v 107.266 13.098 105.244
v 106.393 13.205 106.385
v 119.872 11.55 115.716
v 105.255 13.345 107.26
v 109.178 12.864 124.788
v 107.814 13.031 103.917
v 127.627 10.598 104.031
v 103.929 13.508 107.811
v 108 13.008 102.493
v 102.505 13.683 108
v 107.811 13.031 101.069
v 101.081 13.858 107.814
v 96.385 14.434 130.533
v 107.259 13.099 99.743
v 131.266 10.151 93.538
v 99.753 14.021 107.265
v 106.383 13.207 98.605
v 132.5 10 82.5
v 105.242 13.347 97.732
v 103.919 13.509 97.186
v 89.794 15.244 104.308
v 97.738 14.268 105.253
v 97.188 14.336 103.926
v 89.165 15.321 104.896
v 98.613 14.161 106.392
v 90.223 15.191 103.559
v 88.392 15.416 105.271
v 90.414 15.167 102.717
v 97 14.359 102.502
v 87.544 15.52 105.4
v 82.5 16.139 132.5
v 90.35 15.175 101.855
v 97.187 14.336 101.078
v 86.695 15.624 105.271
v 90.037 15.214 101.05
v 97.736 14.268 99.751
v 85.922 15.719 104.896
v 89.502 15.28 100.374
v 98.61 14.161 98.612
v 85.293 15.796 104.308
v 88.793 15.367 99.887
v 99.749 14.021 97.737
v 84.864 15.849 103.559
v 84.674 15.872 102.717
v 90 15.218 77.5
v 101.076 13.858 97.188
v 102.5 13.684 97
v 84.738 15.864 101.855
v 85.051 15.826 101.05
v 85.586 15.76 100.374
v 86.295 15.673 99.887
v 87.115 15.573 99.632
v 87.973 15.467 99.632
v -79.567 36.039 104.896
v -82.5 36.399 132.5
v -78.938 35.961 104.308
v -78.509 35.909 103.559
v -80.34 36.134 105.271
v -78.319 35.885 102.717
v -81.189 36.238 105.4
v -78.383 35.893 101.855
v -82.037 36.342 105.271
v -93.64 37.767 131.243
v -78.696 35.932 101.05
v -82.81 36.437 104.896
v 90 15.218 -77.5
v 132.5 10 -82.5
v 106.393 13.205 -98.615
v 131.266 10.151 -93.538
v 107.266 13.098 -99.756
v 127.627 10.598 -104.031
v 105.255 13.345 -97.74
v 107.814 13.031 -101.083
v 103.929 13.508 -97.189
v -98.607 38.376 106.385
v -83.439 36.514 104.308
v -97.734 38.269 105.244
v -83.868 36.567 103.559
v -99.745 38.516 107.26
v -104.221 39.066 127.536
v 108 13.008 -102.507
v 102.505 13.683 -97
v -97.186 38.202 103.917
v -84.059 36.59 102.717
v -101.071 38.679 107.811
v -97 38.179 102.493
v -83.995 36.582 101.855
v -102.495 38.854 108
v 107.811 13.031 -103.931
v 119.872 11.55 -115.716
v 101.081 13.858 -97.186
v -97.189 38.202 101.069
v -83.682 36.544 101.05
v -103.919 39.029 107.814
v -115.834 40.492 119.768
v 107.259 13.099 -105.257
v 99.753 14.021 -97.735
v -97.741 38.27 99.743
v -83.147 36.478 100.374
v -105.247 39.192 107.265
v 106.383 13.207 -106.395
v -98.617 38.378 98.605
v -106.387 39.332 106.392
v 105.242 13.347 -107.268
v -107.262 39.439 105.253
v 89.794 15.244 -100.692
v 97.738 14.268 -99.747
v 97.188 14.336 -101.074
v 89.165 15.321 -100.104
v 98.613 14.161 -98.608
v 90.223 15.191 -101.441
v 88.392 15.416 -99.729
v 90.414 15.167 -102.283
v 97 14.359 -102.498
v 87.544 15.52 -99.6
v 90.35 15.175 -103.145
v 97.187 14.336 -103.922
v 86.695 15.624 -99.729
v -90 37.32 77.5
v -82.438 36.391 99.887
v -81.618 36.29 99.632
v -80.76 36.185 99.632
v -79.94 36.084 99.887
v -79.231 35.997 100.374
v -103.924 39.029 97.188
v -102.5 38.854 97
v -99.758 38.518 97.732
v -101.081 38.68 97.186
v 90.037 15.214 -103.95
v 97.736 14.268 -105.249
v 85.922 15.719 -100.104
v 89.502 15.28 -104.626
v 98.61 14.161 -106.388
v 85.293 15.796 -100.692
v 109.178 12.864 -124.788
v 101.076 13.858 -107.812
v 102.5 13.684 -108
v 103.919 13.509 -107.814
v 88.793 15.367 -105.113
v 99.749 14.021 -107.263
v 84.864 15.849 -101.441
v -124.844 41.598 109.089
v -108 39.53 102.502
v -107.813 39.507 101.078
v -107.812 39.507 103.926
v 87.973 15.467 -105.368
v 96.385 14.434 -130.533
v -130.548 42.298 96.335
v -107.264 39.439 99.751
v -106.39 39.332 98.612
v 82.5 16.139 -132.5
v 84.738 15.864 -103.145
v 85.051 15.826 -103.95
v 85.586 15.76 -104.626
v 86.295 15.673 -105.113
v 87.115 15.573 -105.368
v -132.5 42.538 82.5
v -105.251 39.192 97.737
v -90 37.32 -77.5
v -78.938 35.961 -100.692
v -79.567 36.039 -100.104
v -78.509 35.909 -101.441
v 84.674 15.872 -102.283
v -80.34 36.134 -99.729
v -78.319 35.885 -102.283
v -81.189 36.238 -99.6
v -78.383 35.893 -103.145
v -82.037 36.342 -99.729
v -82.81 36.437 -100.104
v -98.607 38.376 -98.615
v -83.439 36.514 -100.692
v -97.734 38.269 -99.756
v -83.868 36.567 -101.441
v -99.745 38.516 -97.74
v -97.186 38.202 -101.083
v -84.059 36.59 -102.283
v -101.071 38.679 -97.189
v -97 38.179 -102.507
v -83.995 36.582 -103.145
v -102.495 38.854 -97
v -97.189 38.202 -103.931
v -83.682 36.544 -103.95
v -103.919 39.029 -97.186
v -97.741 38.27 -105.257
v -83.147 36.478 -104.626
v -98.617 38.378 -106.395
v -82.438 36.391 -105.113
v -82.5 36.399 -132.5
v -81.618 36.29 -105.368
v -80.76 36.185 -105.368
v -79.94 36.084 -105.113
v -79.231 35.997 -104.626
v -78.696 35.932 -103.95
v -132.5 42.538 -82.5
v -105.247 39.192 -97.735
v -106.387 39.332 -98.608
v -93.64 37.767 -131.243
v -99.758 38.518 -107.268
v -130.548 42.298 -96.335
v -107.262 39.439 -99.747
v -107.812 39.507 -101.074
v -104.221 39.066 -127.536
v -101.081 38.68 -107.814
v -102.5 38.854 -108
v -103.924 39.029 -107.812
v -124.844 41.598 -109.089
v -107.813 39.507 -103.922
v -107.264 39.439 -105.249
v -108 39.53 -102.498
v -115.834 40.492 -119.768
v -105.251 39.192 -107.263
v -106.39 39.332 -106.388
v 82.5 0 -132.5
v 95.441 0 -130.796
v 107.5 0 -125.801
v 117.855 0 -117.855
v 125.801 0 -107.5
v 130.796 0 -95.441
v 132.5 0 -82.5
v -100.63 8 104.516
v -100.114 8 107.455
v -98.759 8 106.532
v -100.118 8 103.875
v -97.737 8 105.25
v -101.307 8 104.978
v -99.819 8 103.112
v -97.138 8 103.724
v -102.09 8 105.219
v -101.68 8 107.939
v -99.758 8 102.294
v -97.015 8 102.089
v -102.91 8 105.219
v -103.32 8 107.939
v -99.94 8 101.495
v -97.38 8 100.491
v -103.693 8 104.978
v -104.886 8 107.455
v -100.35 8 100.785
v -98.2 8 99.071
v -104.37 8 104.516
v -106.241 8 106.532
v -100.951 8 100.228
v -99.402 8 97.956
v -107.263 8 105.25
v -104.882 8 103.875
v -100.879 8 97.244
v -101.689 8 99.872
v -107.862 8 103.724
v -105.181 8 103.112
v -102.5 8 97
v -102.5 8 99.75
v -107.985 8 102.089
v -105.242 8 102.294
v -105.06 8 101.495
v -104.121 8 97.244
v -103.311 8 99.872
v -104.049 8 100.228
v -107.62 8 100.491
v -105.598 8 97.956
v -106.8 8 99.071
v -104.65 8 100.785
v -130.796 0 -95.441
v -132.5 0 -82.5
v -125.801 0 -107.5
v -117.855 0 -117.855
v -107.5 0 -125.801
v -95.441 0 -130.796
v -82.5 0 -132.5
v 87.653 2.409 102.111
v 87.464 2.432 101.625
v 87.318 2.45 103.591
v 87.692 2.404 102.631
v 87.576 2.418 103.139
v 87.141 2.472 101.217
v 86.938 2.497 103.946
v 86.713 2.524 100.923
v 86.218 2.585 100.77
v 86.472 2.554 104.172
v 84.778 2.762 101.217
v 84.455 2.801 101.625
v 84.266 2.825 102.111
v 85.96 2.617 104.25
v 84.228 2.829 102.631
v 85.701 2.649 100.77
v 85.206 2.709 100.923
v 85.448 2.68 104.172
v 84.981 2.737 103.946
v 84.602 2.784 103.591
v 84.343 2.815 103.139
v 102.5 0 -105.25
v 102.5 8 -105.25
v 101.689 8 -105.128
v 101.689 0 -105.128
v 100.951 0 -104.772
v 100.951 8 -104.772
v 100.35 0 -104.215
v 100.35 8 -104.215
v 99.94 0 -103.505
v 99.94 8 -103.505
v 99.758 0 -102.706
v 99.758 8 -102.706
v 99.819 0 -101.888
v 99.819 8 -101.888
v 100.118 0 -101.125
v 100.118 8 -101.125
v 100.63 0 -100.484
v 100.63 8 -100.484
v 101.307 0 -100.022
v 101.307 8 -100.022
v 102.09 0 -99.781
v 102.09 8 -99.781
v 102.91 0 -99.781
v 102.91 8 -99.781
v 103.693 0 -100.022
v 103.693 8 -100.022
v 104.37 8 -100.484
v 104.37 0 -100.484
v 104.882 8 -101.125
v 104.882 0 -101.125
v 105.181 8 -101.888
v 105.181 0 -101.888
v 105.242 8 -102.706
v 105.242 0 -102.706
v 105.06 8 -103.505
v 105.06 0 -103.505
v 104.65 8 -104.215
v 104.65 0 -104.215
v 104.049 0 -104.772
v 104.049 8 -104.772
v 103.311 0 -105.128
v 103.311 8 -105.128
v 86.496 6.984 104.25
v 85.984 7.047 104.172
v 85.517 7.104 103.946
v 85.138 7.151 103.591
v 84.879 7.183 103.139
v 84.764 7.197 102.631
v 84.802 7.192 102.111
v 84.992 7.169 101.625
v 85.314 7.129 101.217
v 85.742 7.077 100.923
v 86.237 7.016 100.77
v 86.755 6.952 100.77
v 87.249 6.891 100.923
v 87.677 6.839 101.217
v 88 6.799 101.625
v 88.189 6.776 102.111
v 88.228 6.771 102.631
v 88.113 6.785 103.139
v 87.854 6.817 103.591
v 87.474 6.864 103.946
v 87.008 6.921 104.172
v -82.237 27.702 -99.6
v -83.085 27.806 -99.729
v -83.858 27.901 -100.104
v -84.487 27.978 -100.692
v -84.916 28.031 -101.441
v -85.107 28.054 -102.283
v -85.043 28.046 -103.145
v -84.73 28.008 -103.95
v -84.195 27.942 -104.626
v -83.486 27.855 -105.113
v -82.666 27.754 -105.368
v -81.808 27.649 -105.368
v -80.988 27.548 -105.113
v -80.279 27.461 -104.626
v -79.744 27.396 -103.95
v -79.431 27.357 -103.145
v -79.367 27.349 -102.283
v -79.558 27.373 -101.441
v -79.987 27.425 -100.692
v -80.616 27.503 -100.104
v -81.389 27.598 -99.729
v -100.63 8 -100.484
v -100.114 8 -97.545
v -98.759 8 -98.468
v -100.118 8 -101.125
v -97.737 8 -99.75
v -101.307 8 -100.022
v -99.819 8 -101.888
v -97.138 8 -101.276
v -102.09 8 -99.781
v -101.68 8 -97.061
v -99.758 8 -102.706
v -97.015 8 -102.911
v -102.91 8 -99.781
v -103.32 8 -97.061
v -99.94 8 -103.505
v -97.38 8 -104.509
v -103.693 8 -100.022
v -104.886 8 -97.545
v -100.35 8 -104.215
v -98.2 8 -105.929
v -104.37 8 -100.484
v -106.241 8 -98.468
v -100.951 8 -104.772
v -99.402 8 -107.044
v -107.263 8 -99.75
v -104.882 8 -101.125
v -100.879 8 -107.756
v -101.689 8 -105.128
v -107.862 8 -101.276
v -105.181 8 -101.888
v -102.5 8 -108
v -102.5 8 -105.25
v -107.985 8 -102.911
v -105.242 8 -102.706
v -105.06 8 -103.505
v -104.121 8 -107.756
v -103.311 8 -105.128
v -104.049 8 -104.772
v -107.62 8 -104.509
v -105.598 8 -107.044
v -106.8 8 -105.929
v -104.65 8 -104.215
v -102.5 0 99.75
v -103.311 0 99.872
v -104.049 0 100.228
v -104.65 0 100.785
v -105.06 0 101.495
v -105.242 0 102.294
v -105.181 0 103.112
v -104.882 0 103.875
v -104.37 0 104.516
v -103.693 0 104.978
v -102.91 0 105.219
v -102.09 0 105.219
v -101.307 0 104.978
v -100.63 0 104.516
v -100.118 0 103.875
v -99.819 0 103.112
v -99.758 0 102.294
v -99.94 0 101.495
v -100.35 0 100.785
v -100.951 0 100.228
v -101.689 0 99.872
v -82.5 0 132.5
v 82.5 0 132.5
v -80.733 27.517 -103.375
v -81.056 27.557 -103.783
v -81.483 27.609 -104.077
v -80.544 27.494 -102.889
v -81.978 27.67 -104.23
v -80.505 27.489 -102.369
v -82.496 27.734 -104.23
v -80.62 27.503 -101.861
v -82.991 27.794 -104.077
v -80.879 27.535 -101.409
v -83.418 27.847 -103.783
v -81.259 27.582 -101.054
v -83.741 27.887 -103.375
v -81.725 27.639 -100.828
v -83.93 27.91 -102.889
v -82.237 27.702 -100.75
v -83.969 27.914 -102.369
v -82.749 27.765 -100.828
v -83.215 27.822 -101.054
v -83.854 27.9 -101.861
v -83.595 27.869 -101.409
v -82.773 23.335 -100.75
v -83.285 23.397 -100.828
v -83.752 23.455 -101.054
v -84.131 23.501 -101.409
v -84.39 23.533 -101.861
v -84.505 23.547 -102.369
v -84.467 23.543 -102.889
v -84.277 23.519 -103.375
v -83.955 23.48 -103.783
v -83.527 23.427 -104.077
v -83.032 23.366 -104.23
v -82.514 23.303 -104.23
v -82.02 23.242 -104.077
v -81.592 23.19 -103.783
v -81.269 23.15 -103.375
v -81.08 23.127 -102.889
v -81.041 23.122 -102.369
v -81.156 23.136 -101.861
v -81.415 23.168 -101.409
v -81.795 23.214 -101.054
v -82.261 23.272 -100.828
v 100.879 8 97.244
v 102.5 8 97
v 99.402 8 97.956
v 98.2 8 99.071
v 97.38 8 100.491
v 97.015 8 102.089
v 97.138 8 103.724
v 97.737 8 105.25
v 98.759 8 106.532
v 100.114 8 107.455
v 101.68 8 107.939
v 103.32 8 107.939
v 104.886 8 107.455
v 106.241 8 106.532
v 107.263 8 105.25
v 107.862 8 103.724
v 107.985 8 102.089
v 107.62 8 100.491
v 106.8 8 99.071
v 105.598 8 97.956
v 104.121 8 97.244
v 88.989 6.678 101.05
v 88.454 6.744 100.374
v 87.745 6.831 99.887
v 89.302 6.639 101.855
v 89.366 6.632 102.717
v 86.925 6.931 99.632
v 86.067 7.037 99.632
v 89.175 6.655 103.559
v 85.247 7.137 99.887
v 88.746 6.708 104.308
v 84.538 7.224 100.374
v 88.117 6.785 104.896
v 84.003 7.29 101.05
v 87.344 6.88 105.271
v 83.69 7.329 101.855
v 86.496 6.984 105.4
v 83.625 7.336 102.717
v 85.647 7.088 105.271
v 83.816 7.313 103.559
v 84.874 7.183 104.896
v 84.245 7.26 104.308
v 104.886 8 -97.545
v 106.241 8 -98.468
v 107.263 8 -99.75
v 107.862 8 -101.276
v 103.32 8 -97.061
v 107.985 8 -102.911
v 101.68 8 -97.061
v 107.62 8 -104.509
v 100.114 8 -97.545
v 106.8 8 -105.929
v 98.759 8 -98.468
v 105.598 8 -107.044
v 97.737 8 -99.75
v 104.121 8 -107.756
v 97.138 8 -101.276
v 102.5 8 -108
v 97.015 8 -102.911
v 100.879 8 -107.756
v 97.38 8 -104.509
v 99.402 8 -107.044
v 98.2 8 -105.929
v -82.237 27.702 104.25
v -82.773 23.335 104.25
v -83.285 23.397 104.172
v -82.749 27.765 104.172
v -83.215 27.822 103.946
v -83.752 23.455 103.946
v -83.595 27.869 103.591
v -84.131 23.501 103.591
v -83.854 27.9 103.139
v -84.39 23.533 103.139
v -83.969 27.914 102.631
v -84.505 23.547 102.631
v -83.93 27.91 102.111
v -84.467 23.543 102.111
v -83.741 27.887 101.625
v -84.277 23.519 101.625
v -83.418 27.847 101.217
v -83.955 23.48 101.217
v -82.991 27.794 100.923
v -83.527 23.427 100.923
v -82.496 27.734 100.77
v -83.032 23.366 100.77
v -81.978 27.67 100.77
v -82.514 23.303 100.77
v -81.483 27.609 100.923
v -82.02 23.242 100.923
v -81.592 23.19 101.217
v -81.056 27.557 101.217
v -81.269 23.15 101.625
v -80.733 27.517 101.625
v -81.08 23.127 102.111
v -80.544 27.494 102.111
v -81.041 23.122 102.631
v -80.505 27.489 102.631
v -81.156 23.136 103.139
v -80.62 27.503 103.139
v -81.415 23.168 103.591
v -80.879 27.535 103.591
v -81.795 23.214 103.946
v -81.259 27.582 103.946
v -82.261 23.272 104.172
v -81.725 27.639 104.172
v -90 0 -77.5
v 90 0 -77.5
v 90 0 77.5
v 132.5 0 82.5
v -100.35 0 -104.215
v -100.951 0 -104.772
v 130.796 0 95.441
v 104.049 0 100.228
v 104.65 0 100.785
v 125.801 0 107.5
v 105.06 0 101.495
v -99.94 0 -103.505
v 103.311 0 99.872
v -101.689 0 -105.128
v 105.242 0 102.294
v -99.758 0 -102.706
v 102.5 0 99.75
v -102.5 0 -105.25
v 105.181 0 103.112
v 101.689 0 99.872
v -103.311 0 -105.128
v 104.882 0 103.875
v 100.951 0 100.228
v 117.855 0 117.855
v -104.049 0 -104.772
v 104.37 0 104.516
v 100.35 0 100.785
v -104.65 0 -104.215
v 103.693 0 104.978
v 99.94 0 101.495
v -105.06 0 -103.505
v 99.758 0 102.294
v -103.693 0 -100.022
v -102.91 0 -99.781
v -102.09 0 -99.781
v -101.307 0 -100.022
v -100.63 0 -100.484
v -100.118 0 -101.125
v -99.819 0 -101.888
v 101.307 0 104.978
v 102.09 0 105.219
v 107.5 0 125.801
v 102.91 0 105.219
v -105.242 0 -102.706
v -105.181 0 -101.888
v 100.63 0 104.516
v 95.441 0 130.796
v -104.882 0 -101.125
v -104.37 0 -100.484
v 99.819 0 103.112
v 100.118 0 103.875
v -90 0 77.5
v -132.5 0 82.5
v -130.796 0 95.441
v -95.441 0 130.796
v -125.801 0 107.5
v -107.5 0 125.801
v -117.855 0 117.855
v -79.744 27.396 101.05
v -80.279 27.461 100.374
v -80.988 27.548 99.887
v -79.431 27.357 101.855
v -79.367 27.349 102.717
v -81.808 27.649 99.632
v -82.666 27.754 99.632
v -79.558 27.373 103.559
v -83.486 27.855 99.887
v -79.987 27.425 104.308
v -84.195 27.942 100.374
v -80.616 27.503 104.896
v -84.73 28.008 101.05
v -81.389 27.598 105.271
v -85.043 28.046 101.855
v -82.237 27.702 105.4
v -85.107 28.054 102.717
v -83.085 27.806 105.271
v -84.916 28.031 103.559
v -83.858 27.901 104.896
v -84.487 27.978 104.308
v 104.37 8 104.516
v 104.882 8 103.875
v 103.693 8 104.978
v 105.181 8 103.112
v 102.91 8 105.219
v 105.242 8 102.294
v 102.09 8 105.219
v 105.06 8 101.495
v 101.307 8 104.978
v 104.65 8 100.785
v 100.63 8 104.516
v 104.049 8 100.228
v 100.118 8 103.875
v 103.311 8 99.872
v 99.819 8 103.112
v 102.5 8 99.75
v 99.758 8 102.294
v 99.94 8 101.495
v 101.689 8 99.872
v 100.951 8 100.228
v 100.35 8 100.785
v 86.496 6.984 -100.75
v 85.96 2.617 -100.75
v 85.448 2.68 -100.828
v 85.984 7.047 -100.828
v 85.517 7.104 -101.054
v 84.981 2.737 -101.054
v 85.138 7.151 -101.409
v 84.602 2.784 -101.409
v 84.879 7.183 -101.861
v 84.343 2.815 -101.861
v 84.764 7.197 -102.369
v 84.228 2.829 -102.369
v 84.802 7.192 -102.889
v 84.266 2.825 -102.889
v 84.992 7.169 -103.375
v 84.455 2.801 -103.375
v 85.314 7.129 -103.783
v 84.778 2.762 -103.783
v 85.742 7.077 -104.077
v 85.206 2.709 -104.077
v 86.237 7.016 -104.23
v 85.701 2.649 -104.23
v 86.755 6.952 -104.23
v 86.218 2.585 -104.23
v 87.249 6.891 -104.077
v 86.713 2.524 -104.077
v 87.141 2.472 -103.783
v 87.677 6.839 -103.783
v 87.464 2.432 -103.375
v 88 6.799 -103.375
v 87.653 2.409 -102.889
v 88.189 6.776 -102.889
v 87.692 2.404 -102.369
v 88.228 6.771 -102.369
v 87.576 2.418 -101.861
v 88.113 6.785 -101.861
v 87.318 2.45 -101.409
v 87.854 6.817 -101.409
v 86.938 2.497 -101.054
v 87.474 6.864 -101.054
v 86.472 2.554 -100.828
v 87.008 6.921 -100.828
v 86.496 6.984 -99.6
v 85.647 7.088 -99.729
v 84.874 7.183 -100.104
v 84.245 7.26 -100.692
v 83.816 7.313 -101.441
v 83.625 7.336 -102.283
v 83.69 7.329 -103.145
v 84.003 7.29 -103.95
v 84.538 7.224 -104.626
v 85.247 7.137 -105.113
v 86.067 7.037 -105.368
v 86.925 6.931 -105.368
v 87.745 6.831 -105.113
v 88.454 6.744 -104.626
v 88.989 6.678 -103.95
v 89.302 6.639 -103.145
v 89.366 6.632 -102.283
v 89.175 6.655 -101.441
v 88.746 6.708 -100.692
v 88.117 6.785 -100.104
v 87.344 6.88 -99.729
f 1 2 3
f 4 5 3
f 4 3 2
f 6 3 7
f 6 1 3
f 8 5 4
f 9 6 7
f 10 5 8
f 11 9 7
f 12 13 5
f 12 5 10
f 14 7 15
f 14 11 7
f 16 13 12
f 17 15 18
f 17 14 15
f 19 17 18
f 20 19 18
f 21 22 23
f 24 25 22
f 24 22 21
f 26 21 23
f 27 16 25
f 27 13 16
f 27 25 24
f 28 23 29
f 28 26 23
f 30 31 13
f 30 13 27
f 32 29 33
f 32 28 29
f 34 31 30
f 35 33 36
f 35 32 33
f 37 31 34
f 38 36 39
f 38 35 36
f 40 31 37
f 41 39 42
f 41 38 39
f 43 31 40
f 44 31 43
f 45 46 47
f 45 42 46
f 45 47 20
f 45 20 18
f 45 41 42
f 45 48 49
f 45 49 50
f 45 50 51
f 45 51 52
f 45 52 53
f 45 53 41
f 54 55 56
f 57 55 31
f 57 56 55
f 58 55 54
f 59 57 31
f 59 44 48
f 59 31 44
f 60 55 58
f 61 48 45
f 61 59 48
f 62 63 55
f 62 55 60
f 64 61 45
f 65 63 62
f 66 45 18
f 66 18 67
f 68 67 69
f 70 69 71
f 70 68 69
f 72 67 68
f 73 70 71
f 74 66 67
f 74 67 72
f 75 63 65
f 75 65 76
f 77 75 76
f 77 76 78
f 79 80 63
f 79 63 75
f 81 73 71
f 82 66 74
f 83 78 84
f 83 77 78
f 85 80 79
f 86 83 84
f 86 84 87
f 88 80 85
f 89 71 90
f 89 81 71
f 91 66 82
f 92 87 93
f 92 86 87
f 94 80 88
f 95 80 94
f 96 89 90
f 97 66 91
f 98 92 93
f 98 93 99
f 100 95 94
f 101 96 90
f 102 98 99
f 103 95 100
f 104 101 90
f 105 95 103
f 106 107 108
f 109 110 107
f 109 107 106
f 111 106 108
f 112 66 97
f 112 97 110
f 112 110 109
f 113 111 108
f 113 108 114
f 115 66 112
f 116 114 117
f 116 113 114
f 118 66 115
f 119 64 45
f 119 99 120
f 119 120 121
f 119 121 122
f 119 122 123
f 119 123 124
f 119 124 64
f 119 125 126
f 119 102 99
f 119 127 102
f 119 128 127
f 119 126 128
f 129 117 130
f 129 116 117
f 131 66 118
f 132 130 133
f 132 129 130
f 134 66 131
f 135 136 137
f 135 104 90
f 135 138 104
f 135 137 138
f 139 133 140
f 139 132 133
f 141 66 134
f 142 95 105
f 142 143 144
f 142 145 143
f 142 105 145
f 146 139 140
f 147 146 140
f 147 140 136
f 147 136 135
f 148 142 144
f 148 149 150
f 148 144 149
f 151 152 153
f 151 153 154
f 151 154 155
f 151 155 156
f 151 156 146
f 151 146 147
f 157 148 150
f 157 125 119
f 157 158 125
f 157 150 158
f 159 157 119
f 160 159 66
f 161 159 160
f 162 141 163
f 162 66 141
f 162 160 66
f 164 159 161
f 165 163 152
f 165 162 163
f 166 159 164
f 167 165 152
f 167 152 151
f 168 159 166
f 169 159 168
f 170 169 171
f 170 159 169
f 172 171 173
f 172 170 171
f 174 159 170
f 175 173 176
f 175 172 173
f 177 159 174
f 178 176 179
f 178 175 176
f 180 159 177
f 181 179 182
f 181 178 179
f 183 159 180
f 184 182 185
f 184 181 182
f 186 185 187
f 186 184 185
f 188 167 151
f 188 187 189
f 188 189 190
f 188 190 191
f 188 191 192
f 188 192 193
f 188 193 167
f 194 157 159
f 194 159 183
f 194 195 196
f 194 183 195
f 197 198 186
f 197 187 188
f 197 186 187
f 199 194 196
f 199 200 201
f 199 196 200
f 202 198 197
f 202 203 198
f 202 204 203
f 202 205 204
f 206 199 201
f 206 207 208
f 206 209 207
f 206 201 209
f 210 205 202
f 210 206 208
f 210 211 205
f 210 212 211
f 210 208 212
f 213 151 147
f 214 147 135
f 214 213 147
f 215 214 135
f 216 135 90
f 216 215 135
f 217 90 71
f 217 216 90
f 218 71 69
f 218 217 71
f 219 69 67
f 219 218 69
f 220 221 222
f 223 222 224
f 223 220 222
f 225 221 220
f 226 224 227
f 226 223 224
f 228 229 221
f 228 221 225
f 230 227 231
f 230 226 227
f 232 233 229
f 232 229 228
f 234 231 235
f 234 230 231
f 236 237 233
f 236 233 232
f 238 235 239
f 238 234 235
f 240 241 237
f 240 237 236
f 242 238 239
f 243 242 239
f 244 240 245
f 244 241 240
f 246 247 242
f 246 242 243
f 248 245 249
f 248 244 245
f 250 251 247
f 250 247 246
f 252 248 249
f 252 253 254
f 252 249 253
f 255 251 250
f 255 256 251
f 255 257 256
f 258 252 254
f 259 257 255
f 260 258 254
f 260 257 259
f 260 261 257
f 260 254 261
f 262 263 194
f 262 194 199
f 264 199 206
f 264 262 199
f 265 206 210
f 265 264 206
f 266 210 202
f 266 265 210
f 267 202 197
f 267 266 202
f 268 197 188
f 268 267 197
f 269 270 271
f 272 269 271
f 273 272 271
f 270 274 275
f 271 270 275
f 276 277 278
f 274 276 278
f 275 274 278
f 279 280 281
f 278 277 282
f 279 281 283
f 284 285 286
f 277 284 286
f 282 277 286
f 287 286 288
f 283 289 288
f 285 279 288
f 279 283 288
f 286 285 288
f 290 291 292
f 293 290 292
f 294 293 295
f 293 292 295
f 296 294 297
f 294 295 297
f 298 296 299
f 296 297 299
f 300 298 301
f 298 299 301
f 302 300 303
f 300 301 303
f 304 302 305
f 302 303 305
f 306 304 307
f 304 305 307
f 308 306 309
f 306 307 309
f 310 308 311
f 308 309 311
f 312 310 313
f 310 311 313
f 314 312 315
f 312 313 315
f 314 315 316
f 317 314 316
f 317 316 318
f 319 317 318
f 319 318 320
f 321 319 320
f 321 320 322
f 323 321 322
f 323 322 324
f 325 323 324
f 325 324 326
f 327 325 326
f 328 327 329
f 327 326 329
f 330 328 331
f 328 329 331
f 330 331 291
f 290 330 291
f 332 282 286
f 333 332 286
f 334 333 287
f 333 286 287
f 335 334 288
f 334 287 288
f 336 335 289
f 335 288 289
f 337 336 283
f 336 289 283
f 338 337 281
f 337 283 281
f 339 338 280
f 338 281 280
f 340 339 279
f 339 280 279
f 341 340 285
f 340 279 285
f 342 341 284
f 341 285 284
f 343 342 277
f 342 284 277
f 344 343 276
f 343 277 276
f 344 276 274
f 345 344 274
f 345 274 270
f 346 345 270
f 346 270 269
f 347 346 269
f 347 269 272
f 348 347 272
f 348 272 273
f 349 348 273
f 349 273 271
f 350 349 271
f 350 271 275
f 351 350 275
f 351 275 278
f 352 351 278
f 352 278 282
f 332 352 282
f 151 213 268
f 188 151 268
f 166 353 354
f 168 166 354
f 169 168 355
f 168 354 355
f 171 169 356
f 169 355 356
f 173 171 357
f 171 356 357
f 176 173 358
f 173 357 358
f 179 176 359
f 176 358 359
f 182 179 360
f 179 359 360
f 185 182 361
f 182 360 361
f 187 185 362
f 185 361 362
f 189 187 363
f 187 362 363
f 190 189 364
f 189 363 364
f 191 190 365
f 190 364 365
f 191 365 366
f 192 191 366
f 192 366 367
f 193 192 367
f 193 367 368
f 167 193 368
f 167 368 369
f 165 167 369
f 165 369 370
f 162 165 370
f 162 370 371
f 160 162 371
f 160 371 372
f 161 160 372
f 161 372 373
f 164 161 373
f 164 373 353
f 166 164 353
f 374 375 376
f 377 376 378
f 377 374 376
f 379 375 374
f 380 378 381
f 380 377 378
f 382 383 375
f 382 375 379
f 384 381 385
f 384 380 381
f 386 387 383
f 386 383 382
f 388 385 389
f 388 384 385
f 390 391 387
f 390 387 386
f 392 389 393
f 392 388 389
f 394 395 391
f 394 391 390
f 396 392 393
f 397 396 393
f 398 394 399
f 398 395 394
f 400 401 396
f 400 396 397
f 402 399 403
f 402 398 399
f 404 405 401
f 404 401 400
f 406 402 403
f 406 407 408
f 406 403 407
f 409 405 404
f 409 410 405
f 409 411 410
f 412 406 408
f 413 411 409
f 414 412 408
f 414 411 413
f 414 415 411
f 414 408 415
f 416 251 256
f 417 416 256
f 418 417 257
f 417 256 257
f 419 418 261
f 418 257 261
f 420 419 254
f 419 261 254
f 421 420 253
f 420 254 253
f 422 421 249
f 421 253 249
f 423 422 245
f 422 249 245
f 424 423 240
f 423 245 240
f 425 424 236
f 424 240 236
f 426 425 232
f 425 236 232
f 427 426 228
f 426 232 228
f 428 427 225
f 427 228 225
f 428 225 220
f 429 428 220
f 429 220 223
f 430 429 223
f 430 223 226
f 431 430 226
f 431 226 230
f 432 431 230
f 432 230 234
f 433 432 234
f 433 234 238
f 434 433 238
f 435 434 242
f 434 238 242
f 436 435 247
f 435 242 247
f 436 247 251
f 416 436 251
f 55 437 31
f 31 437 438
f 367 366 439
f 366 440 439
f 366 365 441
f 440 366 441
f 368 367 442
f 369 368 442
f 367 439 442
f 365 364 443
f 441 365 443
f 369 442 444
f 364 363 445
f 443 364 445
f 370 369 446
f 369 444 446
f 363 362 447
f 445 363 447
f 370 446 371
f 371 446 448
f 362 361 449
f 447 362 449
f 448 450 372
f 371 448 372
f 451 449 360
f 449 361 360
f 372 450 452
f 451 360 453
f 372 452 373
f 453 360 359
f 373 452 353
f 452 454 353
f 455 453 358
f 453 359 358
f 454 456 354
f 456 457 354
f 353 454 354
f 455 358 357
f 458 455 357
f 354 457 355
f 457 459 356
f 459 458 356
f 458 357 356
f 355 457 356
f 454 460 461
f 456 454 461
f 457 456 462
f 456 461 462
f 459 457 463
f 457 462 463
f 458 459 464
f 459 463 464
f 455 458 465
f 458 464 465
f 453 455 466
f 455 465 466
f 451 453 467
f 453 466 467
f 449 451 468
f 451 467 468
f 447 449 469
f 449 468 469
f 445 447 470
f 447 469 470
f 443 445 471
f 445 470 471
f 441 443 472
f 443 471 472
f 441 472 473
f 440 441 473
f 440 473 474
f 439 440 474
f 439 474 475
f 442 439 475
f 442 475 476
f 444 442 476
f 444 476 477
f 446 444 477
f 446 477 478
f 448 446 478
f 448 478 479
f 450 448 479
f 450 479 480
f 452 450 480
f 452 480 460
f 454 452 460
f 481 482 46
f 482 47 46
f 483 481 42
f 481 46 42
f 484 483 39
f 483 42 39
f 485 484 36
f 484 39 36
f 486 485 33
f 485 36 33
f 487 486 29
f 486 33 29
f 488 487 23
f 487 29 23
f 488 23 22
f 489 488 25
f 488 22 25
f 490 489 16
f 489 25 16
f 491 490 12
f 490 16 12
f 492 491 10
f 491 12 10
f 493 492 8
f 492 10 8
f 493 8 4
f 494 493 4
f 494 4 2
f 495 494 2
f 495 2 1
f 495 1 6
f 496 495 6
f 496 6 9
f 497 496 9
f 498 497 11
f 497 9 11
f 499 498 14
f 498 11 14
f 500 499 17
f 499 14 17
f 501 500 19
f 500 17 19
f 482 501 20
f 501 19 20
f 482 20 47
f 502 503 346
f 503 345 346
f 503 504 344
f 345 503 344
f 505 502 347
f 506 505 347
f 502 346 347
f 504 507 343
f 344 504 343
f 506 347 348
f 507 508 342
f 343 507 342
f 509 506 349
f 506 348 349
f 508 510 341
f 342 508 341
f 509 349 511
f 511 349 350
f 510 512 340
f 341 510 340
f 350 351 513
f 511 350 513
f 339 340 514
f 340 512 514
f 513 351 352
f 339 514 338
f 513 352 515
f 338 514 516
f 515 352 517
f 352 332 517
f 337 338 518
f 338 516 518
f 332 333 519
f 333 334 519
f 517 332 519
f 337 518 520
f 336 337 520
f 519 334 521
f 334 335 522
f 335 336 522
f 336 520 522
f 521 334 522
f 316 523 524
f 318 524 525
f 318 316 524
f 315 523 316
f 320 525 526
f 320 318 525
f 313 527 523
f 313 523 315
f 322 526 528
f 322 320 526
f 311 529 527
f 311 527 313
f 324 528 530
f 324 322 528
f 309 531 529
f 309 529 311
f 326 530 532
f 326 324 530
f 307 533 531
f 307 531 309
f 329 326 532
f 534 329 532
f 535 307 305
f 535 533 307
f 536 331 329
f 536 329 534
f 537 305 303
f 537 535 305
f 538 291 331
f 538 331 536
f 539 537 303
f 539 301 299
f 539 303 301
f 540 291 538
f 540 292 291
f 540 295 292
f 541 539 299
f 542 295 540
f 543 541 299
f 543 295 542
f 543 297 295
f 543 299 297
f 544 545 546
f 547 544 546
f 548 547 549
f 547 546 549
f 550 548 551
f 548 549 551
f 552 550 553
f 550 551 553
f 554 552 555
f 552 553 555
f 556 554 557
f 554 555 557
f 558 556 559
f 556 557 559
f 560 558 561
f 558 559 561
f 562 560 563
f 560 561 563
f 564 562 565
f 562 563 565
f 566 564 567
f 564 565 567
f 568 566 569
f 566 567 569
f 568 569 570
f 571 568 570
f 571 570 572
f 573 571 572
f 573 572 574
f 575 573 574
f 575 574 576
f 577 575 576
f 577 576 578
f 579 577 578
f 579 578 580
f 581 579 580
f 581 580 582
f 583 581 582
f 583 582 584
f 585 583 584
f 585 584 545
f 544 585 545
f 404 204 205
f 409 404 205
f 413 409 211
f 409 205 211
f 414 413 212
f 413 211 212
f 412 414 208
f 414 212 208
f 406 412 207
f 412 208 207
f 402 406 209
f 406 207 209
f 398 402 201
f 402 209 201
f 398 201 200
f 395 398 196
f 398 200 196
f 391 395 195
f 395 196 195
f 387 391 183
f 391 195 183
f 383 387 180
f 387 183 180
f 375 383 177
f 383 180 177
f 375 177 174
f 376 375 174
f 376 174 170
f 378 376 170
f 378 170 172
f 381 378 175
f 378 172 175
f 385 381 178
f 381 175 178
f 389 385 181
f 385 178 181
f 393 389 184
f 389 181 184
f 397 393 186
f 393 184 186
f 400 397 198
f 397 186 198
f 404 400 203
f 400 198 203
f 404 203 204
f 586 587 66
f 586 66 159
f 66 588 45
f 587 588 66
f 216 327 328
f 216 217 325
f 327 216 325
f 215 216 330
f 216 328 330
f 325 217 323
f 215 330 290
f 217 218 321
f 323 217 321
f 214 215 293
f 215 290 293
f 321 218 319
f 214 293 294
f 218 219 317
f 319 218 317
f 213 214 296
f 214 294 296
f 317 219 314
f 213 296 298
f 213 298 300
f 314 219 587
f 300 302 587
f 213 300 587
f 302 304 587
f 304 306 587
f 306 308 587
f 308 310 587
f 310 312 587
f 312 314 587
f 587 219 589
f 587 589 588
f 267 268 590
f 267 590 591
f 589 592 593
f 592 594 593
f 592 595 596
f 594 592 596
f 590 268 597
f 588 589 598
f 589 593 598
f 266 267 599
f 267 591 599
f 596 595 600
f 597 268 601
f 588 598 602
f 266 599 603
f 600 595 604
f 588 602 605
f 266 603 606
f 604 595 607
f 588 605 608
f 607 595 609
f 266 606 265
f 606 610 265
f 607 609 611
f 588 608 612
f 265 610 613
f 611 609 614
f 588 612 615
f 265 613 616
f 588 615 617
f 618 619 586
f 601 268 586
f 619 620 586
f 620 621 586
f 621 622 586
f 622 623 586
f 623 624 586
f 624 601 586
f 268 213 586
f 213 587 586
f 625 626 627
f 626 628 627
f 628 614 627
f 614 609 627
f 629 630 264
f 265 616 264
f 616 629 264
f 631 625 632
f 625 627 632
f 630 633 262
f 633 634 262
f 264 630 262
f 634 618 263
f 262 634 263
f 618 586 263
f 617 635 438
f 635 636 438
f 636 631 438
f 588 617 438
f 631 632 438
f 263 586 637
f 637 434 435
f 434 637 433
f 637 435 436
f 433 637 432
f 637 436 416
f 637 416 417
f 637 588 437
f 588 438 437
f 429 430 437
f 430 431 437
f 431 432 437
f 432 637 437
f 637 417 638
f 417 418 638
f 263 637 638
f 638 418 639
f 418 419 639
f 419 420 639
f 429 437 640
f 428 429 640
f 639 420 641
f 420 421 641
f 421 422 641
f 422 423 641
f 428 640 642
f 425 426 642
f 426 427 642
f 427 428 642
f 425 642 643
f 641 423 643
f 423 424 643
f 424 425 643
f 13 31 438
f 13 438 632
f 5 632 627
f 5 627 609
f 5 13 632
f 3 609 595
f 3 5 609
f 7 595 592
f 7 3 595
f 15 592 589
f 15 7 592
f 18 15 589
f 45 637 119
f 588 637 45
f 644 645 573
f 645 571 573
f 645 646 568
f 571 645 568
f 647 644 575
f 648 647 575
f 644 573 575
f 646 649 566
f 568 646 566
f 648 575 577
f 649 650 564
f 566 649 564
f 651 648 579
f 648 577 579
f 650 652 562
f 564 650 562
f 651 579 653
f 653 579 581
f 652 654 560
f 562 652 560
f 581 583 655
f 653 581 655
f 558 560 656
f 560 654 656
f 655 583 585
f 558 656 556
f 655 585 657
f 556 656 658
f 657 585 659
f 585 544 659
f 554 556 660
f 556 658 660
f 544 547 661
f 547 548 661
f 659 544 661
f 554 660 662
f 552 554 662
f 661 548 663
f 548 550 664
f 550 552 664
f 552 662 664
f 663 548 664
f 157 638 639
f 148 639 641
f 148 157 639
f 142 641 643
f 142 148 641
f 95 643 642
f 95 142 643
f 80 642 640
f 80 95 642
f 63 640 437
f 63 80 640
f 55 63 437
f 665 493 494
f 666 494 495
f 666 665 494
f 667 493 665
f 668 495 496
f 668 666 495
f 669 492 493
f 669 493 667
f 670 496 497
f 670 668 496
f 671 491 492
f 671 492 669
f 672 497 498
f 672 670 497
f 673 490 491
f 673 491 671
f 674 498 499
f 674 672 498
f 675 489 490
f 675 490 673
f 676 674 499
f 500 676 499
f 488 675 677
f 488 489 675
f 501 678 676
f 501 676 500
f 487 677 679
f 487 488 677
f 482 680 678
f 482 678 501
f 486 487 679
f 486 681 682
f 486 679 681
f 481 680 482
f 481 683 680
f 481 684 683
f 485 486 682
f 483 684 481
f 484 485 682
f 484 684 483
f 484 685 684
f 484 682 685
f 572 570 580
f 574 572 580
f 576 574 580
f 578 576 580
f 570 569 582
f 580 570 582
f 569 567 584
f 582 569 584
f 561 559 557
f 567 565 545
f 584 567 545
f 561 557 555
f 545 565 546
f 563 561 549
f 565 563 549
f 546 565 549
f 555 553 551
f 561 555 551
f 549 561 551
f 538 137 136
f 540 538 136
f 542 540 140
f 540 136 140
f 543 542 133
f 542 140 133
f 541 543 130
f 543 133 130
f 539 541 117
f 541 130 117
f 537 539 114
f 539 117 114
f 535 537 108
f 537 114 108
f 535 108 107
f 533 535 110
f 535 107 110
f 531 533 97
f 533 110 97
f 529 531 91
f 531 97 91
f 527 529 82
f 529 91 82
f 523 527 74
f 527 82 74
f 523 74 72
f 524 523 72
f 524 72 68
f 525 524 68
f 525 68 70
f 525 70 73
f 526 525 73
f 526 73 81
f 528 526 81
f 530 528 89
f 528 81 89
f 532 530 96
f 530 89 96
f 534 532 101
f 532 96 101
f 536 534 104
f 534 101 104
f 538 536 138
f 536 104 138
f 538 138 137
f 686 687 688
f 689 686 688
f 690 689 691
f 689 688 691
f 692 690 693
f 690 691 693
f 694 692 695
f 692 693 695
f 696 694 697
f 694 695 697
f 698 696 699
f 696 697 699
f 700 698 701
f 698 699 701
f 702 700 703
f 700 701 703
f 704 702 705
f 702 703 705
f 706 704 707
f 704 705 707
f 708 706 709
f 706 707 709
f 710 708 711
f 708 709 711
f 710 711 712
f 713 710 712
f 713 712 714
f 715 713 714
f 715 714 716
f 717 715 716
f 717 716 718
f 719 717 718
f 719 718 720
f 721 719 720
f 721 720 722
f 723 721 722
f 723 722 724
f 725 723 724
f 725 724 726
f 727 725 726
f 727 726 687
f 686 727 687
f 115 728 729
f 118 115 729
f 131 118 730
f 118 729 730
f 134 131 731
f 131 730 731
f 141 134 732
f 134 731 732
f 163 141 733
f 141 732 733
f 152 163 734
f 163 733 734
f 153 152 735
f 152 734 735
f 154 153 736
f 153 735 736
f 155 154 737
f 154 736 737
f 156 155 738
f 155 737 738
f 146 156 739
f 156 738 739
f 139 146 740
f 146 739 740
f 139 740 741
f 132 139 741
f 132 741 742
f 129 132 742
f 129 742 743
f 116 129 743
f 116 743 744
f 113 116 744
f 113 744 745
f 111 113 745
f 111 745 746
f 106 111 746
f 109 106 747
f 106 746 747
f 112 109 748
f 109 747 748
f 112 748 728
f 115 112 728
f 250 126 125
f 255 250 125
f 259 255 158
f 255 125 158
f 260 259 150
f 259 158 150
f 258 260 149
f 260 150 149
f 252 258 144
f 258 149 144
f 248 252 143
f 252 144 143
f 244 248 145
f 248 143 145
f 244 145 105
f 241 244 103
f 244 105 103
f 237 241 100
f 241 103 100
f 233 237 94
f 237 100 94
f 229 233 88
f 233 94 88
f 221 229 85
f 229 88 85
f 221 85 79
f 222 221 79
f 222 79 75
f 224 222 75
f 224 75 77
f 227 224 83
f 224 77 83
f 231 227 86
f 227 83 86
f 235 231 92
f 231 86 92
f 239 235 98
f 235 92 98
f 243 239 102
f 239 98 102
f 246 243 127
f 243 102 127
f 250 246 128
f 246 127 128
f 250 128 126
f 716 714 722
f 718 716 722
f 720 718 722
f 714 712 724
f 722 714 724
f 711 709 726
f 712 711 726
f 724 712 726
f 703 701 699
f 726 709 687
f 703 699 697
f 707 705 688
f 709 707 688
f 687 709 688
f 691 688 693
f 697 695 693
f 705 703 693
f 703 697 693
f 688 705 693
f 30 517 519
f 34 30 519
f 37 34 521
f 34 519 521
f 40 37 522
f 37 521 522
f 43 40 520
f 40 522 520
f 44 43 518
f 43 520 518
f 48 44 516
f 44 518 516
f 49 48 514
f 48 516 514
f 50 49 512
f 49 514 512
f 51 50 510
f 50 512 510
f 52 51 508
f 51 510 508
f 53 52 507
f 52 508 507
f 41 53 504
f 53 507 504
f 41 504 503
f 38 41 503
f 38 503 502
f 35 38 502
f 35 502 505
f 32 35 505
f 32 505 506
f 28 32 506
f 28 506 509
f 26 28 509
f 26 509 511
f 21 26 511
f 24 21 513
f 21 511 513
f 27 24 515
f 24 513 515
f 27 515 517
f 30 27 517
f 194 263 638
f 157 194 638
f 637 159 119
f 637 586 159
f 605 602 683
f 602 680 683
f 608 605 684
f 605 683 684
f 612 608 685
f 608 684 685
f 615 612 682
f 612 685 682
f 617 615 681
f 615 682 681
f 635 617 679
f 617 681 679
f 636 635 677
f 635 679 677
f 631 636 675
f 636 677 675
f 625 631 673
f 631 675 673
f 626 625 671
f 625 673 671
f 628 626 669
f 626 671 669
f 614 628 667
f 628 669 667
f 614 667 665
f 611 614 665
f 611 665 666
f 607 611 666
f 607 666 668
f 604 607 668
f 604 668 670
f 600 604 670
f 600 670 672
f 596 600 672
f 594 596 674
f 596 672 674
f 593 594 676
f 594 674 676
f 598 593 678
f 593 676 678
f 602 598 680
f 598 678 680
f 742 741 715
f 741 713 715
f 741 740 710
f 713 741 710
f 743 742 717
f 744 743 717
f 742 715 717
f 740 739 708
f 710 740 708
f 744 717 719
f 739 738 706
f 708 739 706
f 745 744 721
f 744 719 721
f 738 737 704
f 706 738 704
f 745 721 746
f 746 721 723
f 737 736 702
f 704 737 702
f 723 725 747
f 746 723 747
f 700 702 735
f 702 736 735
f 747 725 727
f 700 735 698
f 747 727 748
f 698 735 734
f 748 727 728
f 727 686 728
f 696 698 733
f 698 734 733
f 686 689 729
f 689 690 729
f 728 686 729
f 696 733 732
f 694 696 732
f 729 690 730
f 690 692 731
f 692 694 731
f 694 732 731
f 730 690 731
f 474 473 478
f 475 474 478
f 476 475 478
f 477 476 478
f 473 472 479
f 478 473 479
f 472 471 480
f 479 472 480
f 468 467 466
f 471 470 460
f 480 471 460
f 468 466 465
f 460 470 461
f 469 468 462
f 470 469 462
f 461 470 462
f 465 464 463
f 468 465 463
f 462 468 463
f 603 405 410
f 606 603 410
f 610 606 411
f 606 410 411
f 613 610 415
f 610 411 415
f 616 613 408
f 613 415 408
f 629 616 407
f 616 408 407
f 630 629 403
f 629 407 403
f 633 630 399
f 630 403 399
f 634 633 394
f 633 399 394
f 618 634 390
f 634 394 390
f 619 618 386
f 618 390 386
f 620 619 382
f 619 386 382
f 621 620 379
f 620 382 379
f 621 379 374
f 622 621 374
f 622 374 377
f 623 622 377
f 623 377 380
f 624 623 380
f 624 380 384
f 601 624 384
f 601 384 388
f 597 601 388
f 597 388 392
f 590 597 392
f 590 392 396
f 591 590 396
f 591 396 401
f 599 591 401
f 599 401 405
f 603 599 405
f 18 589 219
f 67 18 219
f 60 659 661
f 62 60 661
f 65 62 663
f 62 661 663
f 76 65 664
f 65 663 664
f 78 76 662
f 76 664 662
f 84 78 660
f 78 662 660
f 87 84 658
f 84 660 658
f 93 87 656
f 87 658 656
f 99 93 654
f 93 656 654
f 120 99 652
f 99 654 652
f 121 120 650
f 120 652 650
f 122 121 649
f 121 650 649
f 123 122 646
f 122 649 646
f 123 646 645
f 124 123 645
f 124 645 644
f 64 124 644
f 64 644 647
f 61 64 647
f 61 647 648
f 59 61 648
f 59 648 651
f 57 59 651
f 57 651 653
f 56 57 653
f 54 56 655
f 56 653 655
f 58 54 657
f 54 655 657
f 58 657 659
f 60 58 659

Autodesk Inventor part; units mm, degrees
ref_plane "YZ Plane" through (0, 0, 0) normal (1, 0, 0) x (0, 1, 0)
ref_plane "XZ Plane" through (0, 0, 0) normal (0, 1, 0) x (-1, 0, 0)
sketch "草圖1" plane through (0, 0, 0) normal (0, 1, 0) x (-1, 0, 0)
  line L0 (132.5, 132.5) -> (-132.5, 132.5)
  line L1 (-132.5, 132.5) -> (-132.5, -132.5)
  line L2 (-132.5, -132.5) -> (132.5, -132.5)
  line L3 (132.5, -132.5) -> (132.5, 132.5)
  line L4 (132.5, 132.5) -> (-132.5, -132.5) construction
  line L5 (-132.5, 132.5) -> (132.5, -132.5) construction
  point P0 (0, 0)
  dimension "d0" = 265
  dimension "d1" = 265
extrude "擠出1" add sketch "草圖1" along normal blind 10
sketch "草圖3" plane through (0, 10, 0) normal (0, 1, 0) x (1, 0, 0)
  line L0 (132.5, -132.5) -> (132.5, 132.5) projected
  line L1 (132.5, 132.5) -> (-132.5, 132.5) projected
  line L2 (-132.5, 132.5) -> (-132.5, -132.5) projected
  line L3 (-132.5, -132.5) -> (132.5, -132.5) projected
  point P0 (0, 0)
extrude "擠出2" add sketch "草圖3" along normal blind 100
sketch "草圖4" plane through (132.5, 0, 132.5) normal (1, 0, 0) x (0, 0, -1)
  line L0 (0, 0) -> (265, 0) projected
  line L1 (265, 0) -> (265, 110) projected
  line L2 (0, 110) -> (265, 110) projected
  line L3 (0, 0) -> (0, 110) projected
  line L4 (0, 0) -> (0, 110) projected
  line L5 (0, 10) -> (265, 10)
  point P0 (132.5, 0)
  dimension "d7" = 10
ref_plane "工作平面2" through (132.5, 10, 132.5) normal (0.1218693, 0.9925462, 0) x (0, 0, -1)
split "分割1" plane through (132.5, 10, 132.5) removes the side toward (0.1218693, 0.9925462, 0)
sketch "草圖5" plane through (0, 0, 0) normal (0, -1, 0) x (1, 0, 0)
  line L0 (-102.5, -102.5) -> (102.5, -102.5) construction
  line L1 (102.5, -102.5) -> (102.5, 102.5) construction
  line L2 (102.5, 102.5) -> (-102.5, 102.5) construction
  line L3 (-102.5, 102.5) -> (-102.5, -102.5) construction
  line L4 (-102.5, -102.5) -> (102.5, 102.5) construction
  line L5 (102.5, -102.5) -> (-102.5, 102.5) construction
  point P0 (0, 0)
  dimension "d9" = 205
  dimension "d10" = 205
hole "孔1" at (-102.5, 0, -102.5) at (102.5, 0, -102.5) at (102.5, 0, 102.5) at (-102.5, 0, 102.5) direction (0, 1, 0) diameter 5.5 depth 8
sketch "草圖6" plane through (-102.5, 8, -102.5) normal (0, -1, 0) x (1, 0, 0)
  circle A0 centre (0, 205) radius 2.75 projected
  circle A1 centre (205, 205) radius 2.75 projected
  circle A2 centre (205, 0) radius 2.75 projected
  circle A3 centre (0, 0) radius 2.75 projected
  circle A4 centre (0, 0) radius 2.75 projected
  circle A5 centre (205, 0) radius 2.75 projected
  circle A6 centre (0, 205) radius 2.75 projected
  point P0 (102.5, 102.5)
hole "孔2" at (-102.5, 8, -102.5) at (102.5, 8, -102.5) at (102.5, 8, 102.5) at (-102.5, 8, 102.5) direction (0, 1, 0) diameter 11 end through all
sketch "草圖7" plane through (132.5, 10, 132.5) normal (0.1218693, 0.9925462, 0) x (0.9925462, -0.1218693, 0)
  line L0 (-215.2937, 30) -> (-45.2937, 30)
  line L1 (-45.2937, 30) -> (-45.2937, 235)
  line L2 (-45.2937, 235) -> (-215.2937, 235)
  line L3 (-215.2937, 235) -> (-215.2937, 30)
  line L4 (-215.2937, 30) -> (-45.2937, 235) construction
  line L5 (-45.2937, 30) -> (-215.2937, 235) construction
  point P0 (-130.2937, 132.5)
  dimension "d25" = 170
  dimension "d26" = 205
hole "孔3" at (-81.1889, 36.2377, 102.5) at (87.5439, 15.5199, 102.5) at (87.5439, 15.5199, -102.5) at (-81.1889, 36.2377, -102.5) direction (-0.1218693, -0.9925462, 0) diameter 3.5 depth 13 counterbore diameter 5.8 counterbore depth 8.6
sketch "草圖8" plane through (0, 0, 0) normal (0, -1, 0) x (1, 0, 0)
  line L0 (-90, 77.5) -> (90, 77.5)
  line L1 (90, 77.5) -> (90, -77.5)
  line L2 (90, -77.5) -> (-90, -77.5)
  line L3 (-90, -77.5) -> (-90, 77.5)
  line L4 (-90, 77.5) -> (90, -77.5) construction
  line L5 (90, 77.5) -> (-90, -77.5) construction
  point P0 (0, 0)
  dimension "d34" = 180
  dimension "d35" = 155
extrude "擠出3" cut sketch "草圖8" against normal through all
fillet "圓角1" radius 50 4 edges at (-132.5, 21.269, 132.5) (-132.5, 21.269, -132.5) (132.5, 5, -132.5) (132.5, 5, 132.5)
properties part number "頸部桌面轉接件"
